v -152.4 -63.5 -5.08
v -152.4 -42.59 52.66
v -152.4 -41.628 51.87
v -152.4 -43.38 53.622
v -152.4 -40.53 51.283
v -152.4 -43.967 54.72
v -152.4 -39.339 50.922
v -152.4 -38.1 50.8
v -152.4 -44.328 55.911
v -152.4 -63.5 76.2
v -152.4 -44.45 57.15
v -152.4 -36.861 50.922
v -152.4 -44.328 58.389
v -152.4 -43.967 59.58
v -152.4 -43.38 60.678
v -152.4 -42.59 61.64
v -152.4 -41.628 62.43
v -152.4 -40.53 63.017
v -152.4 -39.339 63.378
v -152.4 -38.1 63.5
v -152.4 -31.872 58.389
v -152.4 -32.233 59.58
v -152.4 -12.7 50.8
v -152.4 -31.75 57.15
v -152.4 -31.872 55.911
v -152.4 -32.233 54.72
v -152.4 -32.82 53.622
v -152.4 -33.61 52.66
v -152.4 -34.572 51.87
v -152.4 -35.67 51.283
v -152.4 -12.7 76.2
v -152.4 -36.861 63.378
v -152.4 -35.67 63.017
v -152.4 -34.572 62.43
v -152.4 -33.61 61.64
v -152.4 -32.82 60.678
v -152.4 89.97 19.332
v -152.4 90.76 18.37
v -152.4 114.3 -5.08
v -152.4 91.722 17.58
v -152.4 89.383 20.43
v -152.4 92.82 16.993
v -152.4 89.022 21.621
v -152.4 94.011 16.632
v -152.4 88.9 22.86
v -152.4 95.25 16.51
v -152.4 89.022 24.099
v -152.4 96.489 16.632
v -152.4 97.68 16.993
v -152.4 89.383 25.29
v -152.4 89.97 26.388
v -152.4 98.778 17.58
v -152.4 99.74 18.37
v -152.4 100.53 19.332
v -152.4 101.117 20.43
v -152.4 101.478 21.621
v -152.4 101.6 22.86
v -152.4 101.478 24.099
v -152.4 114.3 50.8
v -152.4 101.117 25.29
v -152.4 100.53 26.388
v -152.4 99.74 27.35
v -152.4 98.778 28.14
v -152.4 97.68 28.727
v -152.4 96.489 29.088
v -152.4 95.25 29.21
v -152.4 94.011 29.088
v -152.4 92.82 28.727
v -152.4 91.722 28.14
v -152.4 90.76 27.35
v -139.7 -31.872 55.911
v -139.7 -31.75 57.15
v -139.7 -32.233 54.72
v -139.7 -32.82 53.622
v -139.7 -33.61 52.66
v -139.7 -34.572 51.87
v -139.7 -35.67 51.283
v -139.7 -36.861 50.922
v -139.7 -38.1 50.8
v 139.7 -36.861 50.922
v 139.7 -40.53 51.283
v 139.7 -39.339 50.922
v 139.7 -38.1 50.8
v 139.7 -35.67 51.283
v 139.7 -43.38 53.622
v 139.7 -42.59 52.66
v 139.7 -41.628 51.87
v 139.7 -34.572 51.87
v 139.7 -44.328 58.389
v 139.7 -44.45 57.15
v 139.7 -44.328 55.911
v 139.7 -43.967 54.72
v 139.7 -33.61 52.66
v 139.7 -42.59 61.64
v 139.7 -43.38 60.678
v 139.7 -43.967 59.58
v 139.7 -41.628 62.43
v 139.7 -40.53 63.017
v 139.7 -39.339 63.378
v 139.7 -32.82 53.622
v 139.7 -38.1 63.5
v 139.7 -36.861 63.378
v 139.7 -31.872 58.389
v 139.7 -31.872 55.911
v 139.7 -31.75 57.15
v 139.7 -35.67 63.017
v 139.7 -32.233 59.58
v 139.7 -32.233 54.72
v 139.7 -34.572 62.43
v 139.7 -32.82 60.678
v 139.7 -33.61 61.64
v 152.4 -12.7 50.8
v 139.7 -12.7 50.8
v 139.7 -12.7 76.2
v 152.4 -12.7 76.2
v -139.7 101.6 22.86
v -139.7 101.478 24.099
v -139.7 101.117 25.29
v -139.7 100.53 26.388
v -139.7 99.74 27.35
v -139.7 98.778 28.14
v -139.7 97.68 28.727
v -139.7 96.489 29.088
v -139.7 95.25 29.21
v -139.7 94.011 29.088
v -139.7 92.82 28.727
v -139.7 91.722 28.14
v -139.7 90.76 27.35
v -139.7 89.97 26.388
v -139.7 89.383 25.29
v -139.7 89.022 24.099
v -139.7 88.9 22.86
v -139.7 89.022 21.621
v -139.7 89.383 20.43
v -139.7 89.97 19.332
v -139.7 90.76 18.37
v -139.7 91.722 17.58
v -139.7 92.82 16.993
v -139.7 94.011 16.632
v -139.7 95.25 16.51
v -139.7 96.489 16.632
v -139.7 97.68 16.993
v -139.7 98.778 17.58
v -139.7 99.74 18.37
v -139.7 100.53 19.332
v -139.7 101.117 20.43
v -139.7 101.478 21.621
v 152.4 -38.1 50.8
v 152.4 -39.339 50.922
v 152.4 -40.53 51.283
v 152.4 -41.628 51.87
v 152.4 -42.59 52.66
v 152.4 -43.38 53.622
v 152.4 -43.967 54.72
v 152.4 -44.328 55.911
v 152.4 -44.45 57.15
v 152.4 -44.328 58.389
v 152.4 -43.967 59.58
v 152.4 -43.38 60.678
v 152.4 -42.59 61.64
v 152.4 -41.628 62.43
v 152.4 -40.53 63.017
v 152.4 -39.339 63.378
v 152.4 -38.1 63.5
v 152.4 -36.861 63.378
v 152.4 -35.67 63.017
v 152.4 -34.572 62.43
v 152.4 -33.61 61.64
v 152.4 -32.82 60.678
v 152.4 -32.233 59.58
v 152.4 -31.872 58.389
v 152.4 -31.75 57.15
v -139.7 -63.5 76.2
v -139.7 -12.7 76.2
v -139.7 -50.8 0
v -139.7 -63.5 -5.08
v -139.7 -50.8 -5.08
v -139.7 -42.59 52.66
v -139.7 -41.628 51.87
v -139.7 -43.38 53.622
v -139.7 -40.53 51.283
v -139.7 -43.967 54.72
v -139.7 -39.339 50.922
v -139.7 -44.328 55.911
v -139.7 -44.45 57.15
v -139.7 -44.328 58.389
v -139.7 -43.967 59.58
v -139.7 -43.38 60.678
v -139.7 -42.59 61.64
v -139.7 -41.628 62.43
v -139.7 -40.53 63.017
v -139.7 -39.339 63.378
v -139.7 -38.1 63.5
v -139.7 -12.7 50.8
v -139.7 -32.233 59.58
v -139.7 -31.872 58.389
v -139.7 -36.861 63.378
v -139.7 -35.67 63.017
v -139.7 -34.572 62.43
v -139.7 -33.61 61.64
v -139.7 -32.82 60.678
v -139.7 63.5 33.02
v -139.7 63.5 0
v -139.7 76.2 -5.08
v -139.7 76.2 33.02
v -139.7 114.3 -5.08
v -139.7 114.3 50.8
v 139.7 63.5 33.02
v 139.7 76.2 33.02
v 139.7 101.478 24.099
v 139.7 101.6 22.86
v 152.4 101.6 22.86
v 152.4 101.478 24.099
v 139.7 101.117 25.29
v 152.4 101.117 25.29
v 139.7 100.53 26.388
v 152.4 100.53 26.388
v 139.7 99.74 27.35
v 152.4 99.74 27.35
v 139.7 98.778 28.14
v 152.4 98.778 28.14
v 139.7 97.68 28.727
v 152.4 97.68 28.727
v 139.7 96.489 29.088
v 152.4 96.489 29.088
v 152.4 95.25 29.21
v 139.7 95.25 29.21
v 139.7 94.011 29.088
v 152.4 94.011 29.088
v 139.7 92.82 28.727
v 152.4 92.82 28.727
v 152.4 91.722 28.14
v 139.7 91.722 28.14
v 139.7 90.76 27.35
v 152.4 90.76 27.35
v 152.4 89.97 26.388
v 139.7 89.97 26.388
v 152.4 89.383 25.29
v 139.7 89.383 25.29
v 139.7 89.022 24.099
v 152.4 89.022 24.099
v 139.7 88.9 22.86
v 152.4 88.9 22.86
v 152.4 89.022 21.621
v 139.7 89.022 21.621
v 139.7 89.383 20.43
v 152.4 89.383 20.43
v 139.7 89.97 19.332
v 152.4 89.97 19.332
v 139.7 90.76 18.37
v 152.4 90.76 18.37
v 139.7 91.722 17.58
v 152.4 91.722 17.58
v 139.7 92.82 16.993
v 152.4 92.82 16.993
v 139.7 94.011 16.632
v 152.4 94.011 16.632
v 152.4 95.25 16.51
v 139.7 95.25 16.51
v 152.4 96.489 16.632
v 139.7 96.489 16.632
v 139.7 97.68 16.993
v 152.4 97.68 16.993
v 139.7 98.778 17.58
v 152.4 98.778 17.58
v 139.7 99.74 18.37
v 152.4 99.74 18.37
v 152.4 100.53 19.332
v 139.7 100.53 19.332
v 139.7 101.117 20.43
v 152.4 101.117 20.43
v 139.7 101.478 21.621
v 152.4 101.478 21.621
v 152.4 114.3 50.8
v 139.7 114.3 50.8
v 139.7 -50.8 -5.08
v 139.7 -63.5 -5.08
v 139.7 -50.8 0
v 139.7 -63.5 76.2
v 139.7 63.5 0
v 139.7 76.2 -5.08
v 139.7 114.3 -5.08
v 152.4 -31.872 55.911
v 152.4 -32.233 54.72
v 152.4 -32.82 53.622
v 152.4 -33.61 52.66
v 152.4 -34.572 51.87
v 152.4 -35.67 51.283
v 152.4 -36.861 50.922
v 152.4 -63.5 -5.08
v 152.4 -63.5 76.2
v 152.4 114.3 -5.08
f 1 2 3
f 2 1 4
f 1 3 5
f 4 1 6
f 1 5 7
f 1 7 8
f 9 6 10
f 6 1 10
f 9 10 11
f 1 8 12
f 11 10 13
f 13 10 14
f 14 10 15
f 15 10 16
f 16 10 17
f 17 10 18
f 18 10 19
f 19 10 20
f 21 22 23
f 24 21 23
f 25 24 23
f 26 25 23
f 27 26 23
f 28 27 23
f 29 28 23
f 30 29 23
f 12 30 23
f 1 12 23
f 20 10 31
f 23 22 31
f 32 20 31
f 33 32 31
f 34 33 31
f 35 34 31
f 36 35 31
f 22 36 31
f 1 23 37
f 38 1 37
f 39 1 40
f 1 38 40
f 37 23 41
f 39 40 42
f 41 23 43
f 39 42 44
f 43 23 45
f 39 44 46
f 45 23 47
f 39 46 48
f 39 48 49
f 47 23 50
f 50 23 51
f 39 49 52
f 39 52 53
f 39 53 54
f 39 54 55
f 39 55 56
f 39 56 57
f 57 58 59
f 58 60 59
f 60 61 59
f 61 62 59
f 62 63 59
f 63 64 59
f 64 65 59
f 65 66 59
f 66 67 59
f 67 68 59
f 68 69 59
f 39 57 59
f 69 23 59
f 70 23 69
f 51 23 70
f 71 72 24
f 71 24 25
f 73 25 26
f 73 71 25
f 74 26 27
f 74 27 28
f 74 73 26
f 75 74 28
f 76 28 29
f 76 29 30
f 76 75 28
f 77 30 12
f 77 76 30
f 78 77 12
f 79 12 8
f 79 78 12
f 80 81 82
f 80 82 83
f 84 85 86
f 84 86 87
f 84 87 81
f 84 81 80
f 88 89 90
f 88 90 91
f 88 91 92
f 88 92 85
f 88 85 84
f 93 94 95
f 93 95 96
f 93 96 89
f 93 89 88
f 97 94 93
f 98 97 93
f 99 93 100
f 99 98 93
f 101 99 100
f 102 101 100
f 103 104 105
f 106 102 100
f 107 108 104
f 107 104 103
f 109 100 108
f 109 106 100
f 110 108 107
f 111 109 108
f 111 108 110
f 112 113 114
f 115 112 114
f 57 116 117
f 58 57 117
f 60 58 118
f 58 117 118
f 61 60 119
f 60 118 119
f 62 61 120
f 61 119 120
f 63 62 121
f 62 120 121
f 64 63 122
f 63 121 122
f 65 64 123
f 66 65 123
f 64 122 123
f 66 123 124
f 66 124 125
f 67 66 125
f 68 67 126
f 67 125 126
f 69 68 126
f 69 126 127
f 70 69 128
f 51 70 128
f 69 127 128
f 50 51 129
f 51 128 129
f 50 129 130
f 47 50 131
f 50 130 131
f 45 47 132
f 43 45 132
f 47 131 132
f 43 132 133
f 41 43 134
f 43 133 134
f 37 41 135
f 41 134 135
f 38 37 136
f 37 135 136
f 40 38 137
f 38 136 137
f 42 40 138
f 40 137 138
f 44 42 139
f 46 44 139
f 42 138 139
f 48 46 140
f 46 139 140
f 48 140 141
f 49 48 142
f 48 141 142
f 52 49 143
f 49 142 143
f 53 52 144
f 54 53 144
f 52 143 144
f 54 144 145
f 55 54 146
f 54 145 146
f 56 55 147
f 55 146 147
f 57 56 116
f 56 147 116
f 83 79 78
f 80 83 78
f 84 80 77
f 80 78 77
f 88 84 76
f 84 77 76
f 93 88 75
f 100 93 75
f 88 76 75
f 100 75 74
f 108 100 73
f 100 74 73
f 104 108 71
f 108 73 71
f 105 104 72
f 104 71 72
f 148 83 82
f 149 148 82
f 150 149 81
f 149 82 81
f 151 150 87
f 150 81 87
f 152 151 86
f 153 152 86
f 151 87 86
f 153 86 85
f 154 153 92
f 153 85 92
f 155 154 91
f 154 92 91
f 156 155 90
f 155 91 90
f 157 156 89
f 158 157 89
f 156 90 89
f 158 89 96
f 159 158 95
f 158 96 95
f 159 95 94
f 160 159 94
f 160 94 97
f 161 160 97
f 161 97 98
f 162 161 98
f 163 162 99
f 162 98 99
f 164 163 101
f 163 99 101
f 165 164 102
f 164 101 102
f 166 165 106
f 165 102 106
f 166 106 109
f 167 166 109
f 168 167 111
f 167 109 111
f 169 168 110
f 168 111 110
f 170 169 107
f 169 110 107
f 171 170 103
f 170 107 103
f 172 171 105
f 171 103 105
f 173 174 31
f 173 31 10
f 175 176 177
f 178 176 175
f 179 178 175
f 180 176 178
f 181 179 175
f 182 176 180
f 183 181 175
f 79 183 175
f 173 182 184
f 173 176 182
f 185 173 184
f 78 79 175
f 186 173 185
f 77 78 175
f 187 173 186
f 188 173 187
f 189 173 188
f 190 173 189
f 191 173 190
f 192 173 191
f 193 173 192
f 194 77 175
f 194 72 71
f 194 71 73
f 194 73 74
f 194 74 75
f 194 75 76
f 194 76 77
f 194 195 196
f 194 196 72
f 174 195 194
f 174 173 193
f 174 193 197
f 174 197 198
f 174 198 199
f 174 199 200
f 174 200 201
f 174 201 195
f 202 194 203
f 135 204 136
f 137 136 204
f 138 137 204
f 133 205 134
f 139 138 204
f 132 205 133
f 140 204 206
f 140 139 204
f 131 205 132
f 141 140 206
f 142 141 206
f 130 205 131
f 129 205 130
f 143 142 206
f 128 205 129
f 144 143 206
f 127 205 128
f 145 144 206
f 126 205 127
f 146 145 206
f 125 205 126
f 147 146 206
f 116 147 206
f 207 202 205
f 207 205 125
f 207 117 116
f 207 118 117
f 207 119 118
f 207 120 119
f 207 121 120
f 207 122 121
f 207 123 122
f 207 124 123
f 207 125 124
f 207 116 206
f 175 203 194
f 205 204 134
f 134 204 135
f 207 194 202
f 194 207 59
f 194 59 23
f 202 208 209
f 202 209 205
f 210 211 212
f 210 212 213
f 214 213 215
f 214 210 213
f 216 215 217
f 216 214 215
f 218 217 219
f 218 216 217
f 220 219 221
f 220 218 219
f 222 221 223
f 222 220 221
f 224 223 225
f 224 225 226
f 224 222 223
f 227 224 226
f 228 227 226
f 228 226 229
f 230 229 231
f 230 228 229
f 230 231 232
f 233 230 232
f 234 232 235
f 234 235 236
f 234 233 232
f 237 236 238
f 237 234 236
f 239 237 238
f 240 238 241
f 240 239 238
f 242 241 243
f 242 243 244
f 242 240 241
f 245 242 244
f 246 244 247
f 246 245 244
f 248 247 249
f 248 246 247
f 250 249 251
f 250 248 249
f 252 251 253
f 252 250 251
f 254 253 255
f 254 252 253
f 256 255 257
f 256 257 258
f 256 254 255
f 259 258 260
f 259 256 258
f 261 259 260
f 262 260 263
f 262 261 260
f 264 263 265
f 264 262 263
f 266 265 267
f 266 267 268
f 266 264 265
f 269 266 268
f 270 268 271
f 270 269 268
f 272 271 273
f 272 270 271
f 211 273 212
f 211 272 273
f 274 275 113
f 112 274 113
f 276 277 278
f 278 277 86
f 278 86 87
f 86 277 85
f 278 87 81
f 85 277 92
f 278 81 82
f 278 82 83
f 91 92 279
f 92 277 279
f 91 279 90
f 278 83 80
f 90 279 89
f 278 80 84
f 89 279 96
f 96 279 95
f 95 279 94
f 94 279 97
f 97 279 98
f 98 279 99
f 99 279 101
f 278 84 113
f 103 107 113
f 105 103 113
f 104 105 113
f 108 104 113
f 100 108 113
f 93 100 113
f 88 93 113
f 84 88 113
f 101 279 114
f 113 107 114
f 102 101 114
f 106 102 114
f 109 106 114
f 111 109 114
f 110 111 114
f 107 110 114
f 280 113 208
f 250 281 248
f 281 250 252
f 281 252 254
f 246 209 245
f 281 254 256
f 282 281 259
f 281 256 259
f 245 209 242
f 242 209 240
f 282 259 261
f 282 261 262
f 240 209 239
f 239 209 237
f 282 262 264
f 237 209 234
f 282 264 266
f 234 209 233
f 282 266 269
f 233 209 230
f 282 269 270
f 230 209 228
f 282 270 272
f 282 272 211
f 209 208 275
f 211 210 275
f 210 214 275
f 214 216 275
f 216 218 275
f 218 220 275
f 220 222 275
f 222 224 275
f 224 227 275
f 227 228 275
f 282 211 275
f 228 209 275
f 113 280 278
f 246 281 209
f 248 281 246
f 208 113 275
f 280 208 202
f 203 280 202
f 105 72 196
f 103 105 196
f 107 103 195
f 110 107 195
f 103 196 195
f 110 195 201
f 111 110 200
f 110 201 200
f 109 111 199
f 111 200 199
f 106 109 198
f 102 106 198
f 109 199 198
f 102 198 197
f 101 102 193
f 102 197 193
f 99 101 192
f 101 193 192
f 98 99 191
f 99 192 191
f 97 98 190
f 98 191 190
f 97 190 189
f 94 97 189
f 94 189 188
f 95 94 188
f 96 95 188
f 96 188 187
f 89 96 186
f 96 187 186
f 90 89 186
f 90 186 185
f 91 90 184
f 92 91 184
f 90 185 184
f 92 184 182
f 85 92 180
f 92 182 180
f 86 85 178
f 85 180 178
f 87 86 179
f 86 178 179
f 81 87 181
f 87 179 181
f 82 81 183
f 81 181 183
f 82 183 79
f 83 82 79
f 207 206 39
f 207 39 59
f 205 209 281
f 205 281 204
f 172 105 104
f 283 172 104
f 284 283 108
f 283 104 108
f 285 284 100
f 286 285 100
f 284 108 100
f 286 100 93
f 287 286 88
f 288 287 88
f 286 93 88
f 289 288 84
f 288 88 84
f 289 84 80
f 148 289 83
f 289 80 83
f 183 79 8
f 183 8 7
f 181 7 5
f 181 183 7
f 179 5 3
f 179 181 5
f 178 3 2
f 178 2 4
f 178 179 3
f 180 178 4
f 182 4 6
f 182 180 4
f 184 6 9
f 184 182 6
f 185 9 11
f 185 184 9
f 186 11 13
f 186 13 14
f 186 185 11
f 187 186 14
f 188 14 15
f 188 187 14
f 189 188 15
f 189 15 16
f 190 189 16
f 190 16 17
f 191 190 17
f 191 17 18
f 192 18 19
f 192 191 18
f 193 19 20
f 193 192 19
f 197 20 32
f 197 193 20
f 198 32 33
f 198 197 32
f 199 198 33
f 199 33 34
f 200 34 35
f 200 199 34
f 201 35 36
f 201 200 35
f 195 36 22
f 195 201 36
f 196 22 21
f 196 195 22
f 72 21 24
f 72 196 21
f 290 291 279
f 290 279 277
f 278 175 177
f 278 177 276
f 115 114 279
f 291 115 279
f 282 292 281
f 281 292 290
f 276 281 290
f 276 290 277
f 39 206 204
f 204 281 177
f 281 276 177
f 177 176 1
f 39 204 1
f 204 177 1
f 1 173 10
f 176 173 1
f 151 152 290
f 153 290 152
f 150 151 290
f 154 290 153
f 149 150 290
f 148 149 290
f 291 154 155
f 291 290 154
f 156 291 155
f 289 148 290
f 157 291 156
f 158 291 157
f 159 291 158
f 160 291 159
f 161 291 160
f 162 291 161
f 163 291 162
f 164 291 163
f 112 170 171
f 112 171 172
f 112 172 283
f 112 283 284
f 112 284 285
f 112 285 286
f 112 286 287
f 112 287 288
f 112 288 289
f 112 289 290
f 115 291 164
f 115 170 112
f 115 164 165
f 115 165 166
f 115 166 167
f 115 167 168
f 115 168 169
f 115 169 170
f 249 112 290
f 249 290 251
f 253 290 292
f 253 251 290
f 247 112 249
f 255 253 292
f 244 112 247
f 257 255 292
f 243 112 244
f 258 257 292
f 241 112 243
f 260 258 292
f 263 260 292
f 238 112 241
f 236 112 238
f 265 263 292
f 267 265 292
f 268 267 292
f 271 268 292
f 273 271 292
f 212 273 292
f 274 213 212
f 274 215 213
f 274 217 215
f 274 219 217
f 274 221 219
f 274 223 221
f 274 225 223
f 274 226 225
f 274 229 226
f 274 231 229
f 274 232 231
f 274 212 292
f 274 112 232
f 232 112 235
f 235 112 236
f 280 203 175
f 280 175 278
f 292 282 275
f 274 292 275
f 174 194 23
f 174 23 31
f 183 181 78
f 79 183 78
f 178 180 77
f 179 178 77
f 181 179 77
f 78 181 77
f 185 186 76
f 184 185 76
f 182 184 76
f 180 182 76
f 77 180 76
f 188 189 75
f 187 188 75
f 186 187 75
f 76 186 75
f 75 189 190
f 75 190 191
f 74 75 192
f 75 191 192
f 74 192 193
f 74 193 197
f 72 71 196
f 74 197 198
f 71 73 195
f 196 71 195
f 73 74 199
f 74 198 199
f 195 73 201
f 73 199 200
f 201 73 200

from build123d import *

# Parameters (mm, degrees)
F0_W      = 279.4
F0_H      = 127
F1_DEPTH  = 5.08
F2_R      = 6.35
F3_DEPTH  = 12.7
F5_W      = 279.4
F5_H      = 38.1
F6_DEPTH  = 12.7
F8_DEPTH  = 279.4
F9_W      = 279.4
F9_H      = 12.7
F10_DEPTH = 25.4


with BuildPart() as f1:
    # F0 (on Top) → F1 (new body)
    with BuildSketch(Plane.XY):
        Rectangle(F0_W, F0_H)
    extrude(amount=-F1_DEPTH)

    # F2 (on face) → F3 (join)
    with BuildSketch(Plane.YZ.offset(139.7)):
        Polygon((-63.5, 50.8), (-63.5, -5.08), (114.3, -5.08), (114.3, 50.8), (-12.7, 50.8), (-38.1, 50.8), align=None)
        with Locations((95.25, 22.86)):
            Circle(F2_R, mode=Mode.SUBTRACT)
        Polygon((-63.5, 76.2), (-63.5, 50.8), (-38.1, 50.8), (-12.7, 50.8), (-12.7, 76.2), align=None)
        with BuildLine():
            ThreePointArc((-31.75, 57.15), (-33.6098719395, 52.6598719395), (-38.1, 50.8))
            ThreePointArc((-38.1, 50.8), (-42.5901280605, 61.6401280605), (-31.75, 57.15))
        make_face(mode=Mode.SUBTRACT)
    extrude(amount=F3_DEPTH)

    # F4: F1 across plane


with BuildPart() as f1_1:
    add(f1.part)
    add(f1.part.mirror(Plane.YZ))

    # F5 (on face) → F6 (join)
    with BuildSketch(Plane(origin=(0, 63.5, 0), x_dir=(-1, 0, 0), z_dir=(0, 1, 0))):
        with Locations((0, 13.97)):
            Rectangle(F5_W, F5_H)
    extrude(amount=F6_DEPTH)

    # F9 (on face) → F10 (cut)
    with BuildSketch(Plane.XY):
        with Locations((0, -57.15)):
            Rectangle(F9_W, F9_H)
    extrude(amount=-F10_DEPTH, mode=Mode.SUBTRACT)


with BuildPart() as f8:
    # F7 (on face) → F8 (new body)
    with BuildSketch(Plane.YZ.offset(-139.7)):
        with BuildLine():
            ThreePointArc((-38.1, 50.8), (-33.6098719395, 52.6598719395), (-31.75, 57.15))
            ThreePointArc((-31.75, 57.15), (-42.5901280605, 61.6401280605), (-38.1, 50.8))
        make_face()
    extrude(amount=F8_DEPTH)


solid = Compound([f1_1.part, f8.part])
